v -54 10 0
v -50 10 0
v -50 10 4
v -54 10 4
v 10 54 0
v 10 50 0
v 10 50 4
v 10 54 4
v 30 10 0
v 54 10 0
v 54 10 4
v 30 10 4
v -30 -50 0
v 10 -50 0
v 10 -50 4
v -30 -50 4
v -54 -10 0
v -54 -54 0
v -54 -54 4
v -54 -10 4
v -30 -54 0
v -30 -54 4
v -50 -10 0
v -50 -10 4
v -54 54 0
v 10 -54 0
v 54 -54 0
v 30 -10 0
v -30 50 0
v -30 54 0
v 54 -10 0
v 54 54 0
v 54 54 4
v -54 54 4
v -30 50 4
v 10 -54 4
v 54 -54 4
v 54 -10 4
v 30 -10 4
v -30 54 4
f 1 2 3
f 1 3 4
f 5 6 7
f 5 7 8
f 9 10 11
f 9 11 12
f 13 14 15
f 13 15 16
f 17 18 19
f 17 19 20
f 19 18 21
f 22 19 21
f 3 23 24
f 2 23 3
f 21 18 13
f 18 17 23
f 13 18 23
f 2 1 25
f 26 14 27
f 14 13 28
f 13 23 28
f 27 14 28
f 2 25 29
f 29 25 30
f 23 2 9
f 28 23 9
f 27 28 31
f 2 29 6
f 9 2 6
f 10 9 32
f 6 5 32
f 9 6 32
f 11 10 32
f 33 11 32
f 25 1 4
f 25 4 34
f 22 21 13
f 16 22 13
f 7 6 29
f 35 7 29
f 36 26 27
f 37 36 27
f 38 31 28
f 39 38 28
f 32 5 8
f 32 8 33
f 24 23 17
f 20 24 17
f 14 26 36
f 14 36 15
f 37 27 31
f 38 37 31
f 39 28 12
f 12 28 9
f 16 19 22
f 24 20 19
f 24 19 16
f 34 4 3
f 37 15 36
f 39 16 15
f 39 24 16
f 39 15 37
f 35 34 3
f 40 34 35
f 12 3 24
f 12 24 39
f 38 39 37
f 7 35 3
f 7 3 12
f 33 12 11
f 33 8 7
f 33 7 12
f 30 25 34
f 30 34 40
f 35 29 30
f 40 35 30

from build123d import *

# Parameters (mm, degrees)
SKETCH2_W           = 108
SKETCH2_H           = 108
BOSS_EXTRUDE1_DEPTH = 4
SKETCH3_W           = 20
SKETCH3_H           = 8
SKETCH3_W_2         = 8
SKETCH3_H_2         = 20
CUT_EXTRUDE1_DEPTH  = 4
SKETCH4_W           = 20
SKETCH4_H           = 4
SKETCH4_H_2         = 20
CUT_EXTRUDE2_DEPTH  = 4


with BuildPart() as part:
    # Sketch2 → Boss-Extrude1 (new body)
    with BuildSketch(Plane.XY):
        Rectangle(SKETCH2_W, SKETCH2_H)
    extrude(amount=BOSS_EXTRUDE1_DEPTH)

    # Sketch3 → Cut-Extrude1 (cut)
    with BuildSketch(Plane(origin=(0, 0, 0), x_dir=(-1, 0, 0), z_dir=(0, 0, -1))):
        with Locations((0, 54)):
            Rectangle(SKETCH3_W, SKETCH3_H)
        with Locations((54, 0)):
            Rectangle(SKETCH3_W_2, SKETCH3_H_2)
        with Locations((-54, 0)):
            Rectangle(SKETCH3_W_2, SKETCH3_H_2)
        with Locations((0, -54)):
            Rectangle(SKETCH3_W, SKETCH3_H)
    extrude(amount=-CUT_EXTRUDE1_DEPTH, mode=Mode.SUBTRACT)

    # Sketch4 → Cut-Extrude2 (cut)
    with BuildSketch(Plane(origin=(0, 0, 0), x_dir=(-1, 0, 0), z_dir=(0, 0, -1))):
        with Locations((20, 52)):
            Rectangle(SKETCH4_W, SKETCH4_H)
        with Locations((20, -52)):
            Rectangle(SKETCH4_W, SKETCH4_H)
        with Locations((-40, 0)):
            Rectangle(SKETCH4_W, SKETCH4_H_2)
    extrude(amount=-CUT_EXTRUDE2_DEPTH, mode=Mode.SUBTRACT)


solid = part.part
